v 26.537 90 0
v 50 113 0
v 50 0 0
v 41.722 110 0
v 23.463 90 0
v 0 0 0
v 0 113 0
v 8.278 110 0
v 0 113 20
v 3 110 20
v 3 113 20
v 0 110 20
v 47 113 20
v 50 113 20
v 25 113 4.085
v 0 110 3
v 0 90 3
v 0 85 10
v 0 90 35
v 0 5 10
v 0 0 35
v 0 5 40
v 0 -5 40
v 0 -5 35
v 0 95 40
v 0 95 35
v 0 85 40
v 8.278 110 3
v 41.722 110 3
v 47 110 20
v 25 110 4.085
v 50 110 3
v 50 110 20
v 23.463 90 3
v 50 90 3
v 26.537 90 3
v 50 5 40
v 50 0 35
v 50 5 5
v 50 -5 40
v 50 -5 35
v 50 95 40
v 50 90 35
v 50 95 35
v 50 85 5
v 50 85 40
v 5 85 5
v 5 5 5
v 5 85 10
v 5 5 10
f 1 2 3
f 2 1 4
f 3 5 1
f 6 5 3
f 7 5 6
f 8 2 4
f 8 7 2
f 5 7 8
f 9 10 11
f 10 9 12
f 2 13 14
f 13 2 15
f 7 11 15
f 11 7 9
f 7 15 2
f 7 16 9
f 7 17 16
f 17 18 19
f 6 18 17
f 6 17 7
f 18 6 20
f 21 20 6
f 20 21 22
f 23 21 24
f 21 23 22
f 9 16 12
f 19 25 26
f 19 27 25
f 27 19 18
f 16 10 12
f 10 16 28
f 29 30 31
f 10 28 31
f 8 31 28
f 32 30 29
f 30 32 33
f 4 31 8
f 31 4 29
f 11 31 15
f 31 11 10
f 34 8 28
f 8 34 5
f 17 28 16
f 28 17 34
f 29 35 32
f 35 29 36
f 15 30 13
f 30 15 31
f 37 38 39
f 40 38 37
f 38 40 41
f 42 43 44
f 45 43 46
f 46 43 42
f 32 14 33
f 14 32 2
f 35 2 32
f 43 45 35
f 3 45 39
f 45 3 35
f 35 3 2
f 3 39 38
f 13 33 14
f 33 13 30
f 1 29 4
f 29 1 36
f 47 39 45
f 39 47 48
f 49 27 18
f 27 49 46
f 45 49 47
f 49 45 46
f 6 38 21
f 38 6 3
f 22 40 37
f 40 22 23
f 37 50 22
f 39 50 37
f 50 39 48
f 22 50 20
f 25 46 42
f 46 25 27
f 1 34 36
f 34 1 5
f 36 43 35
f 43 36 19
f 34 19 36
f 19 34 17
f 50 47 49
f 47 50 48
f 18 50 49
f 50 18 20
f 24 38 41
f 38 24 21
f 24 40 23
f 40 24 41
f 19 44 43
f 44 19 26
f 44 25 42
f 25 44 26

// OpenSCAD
/* Power Box Holder
This is designed to hold a power box under a cabinet
for under-cabinet lighting.

(c) Daniel T Urquhart 2018
This work is licensed under a Creative Commons Attribution-ShareAlike 4.0 International License.
*/

/* [Basics] */

// Select which part to generate
part =  0; //[0:BoxFront, 1:BoxBack, 2:BracketLeft,3:BracketRight]

// Enable extension to hold wires?
ENABLE_EXTENSION =1; //[1:EnableWireHolder,0:Disable]

//Length of bracket (mm)
fullLen = 140;

//width of main body
centerWidth = 80;


/* [Advanced] */


//length of main body
centerLen = 50;

//width of extension
extensionWidth = 30;

//height of extension
extensionHeight = 20;

//wall thickness
wallWidth = 5;
//extension wall thickness
thinWall = 3;
//height (depth) of the holder
centerHeight = 35;

// Screw whole diameter
screwSize = 25.4/8; 



//creates a screwHole with countersink at 0,0,0
module screwHole()
{
    cylinder(r=screwSize/2,h=20,$fn = 25, center=true);
    sphere(r=screwSize,h=2,$fn = 25, center=true);
}



if( part == 0 || part == 1)
{
	//base
	//translate([0,-extensionWidth*part,0])
	cube([centerLen,centerWidth+wallWidth,wallWidth]);

	//side walls
	cube([centerLen,wallWidth,centerHeight+wallWidth]);
	translate([0,centerWidth+wallWidth])
	cube([centerLen,wallWidth,centerHeight+wallWidth]);

	//lower lip
	cube([wallWidth,centerWidth+wallWidth,wallWidth*2]);

	//upper lip
	translate([0,-wallWidth,centerHeight])
	cube([centerLen,wallWidth*2,wallWidth]);

	translate([0,centerWidth+wallWidth,centerHeight])
	cube([centerLen,wallWidth*2,wallWidth]);

	//extension lip
	if(ENABLE_EXTENSION)
	{
		centerX = (centerLen-thinWall)/2;
		for(x = [0,centerLen-thinWall]){
			extensionEdge   = part==0?centerWidth:0;
			extensionOffset = part==0?centerWidth+extensionWidth:-extensionWidth;
			
			//extension lip
			hull(){
			translate([x,extensionOffset,0])
				cube([thinWall,thinWall,extensionHeight]);
				
			translate([centerX,extensionOffset,0])
				cube([thinWall,thinWall,thinWall]);
			}
			
			//extension base
			hull(){
				translate([x==0?0:x-thinWall,extensionOffset,0])
					cube([thinWall*2,thinWall,thinWall]);
					
				translate([x,extensionEdge,0])
					cube([thinWall,thinWall,thinWall]);
				translate([centerX,extensionEdge+thinWall,0])
					cube([thinWall,thinWall,thinWall]);	
			}
		}
	}
}

module bracket()
{
    bracketSize = 12+wallWidth;
    translate([0,0,wallWidth])
        cube([fullLen,bracketSize,wallWidth]);
    
    cube([fullLen,wallWidth, wallWidth]);
    //rail
    translate([0,-wallWidth,0])
      cube([fullLen,wallWidth, wallWidth]);
    
    translate([0,0,0])
    intersection(){
    cube([fullLen,bracketSize, wallWidth]);
    translate([fullLen/2,0,fullLen*2.5])
     rotate([0,90,90])
      cylinder(h=bracketSize,r=fullLen*2.5,$fa = 1);
    }
}

module bracketWithScrews()
{
    difference()
    {
        bracket();
        
        translate([wallWidth*2,wallWidth*2,wallWidth])
            screwHole();
        translate([fullLen-wallWidth*2,wallWidth*2,wallWidth])
            screwHole();
    }
}



//double bracket would be cool but I can't print it...
if(part == 2){
	translate([0,centerWidth,0])
	translate([-fullLen/2,0,0])
		bracketWithScrews();
}
//translate([-wallWidth,0,0])
//cube([wallWidth*2,centerWidth,wallWidth*2]);
if(part == 3){
	rotate([0,0,180])
	translate([-fullLen/2,0,0])
		bracketWithScrews();
}
